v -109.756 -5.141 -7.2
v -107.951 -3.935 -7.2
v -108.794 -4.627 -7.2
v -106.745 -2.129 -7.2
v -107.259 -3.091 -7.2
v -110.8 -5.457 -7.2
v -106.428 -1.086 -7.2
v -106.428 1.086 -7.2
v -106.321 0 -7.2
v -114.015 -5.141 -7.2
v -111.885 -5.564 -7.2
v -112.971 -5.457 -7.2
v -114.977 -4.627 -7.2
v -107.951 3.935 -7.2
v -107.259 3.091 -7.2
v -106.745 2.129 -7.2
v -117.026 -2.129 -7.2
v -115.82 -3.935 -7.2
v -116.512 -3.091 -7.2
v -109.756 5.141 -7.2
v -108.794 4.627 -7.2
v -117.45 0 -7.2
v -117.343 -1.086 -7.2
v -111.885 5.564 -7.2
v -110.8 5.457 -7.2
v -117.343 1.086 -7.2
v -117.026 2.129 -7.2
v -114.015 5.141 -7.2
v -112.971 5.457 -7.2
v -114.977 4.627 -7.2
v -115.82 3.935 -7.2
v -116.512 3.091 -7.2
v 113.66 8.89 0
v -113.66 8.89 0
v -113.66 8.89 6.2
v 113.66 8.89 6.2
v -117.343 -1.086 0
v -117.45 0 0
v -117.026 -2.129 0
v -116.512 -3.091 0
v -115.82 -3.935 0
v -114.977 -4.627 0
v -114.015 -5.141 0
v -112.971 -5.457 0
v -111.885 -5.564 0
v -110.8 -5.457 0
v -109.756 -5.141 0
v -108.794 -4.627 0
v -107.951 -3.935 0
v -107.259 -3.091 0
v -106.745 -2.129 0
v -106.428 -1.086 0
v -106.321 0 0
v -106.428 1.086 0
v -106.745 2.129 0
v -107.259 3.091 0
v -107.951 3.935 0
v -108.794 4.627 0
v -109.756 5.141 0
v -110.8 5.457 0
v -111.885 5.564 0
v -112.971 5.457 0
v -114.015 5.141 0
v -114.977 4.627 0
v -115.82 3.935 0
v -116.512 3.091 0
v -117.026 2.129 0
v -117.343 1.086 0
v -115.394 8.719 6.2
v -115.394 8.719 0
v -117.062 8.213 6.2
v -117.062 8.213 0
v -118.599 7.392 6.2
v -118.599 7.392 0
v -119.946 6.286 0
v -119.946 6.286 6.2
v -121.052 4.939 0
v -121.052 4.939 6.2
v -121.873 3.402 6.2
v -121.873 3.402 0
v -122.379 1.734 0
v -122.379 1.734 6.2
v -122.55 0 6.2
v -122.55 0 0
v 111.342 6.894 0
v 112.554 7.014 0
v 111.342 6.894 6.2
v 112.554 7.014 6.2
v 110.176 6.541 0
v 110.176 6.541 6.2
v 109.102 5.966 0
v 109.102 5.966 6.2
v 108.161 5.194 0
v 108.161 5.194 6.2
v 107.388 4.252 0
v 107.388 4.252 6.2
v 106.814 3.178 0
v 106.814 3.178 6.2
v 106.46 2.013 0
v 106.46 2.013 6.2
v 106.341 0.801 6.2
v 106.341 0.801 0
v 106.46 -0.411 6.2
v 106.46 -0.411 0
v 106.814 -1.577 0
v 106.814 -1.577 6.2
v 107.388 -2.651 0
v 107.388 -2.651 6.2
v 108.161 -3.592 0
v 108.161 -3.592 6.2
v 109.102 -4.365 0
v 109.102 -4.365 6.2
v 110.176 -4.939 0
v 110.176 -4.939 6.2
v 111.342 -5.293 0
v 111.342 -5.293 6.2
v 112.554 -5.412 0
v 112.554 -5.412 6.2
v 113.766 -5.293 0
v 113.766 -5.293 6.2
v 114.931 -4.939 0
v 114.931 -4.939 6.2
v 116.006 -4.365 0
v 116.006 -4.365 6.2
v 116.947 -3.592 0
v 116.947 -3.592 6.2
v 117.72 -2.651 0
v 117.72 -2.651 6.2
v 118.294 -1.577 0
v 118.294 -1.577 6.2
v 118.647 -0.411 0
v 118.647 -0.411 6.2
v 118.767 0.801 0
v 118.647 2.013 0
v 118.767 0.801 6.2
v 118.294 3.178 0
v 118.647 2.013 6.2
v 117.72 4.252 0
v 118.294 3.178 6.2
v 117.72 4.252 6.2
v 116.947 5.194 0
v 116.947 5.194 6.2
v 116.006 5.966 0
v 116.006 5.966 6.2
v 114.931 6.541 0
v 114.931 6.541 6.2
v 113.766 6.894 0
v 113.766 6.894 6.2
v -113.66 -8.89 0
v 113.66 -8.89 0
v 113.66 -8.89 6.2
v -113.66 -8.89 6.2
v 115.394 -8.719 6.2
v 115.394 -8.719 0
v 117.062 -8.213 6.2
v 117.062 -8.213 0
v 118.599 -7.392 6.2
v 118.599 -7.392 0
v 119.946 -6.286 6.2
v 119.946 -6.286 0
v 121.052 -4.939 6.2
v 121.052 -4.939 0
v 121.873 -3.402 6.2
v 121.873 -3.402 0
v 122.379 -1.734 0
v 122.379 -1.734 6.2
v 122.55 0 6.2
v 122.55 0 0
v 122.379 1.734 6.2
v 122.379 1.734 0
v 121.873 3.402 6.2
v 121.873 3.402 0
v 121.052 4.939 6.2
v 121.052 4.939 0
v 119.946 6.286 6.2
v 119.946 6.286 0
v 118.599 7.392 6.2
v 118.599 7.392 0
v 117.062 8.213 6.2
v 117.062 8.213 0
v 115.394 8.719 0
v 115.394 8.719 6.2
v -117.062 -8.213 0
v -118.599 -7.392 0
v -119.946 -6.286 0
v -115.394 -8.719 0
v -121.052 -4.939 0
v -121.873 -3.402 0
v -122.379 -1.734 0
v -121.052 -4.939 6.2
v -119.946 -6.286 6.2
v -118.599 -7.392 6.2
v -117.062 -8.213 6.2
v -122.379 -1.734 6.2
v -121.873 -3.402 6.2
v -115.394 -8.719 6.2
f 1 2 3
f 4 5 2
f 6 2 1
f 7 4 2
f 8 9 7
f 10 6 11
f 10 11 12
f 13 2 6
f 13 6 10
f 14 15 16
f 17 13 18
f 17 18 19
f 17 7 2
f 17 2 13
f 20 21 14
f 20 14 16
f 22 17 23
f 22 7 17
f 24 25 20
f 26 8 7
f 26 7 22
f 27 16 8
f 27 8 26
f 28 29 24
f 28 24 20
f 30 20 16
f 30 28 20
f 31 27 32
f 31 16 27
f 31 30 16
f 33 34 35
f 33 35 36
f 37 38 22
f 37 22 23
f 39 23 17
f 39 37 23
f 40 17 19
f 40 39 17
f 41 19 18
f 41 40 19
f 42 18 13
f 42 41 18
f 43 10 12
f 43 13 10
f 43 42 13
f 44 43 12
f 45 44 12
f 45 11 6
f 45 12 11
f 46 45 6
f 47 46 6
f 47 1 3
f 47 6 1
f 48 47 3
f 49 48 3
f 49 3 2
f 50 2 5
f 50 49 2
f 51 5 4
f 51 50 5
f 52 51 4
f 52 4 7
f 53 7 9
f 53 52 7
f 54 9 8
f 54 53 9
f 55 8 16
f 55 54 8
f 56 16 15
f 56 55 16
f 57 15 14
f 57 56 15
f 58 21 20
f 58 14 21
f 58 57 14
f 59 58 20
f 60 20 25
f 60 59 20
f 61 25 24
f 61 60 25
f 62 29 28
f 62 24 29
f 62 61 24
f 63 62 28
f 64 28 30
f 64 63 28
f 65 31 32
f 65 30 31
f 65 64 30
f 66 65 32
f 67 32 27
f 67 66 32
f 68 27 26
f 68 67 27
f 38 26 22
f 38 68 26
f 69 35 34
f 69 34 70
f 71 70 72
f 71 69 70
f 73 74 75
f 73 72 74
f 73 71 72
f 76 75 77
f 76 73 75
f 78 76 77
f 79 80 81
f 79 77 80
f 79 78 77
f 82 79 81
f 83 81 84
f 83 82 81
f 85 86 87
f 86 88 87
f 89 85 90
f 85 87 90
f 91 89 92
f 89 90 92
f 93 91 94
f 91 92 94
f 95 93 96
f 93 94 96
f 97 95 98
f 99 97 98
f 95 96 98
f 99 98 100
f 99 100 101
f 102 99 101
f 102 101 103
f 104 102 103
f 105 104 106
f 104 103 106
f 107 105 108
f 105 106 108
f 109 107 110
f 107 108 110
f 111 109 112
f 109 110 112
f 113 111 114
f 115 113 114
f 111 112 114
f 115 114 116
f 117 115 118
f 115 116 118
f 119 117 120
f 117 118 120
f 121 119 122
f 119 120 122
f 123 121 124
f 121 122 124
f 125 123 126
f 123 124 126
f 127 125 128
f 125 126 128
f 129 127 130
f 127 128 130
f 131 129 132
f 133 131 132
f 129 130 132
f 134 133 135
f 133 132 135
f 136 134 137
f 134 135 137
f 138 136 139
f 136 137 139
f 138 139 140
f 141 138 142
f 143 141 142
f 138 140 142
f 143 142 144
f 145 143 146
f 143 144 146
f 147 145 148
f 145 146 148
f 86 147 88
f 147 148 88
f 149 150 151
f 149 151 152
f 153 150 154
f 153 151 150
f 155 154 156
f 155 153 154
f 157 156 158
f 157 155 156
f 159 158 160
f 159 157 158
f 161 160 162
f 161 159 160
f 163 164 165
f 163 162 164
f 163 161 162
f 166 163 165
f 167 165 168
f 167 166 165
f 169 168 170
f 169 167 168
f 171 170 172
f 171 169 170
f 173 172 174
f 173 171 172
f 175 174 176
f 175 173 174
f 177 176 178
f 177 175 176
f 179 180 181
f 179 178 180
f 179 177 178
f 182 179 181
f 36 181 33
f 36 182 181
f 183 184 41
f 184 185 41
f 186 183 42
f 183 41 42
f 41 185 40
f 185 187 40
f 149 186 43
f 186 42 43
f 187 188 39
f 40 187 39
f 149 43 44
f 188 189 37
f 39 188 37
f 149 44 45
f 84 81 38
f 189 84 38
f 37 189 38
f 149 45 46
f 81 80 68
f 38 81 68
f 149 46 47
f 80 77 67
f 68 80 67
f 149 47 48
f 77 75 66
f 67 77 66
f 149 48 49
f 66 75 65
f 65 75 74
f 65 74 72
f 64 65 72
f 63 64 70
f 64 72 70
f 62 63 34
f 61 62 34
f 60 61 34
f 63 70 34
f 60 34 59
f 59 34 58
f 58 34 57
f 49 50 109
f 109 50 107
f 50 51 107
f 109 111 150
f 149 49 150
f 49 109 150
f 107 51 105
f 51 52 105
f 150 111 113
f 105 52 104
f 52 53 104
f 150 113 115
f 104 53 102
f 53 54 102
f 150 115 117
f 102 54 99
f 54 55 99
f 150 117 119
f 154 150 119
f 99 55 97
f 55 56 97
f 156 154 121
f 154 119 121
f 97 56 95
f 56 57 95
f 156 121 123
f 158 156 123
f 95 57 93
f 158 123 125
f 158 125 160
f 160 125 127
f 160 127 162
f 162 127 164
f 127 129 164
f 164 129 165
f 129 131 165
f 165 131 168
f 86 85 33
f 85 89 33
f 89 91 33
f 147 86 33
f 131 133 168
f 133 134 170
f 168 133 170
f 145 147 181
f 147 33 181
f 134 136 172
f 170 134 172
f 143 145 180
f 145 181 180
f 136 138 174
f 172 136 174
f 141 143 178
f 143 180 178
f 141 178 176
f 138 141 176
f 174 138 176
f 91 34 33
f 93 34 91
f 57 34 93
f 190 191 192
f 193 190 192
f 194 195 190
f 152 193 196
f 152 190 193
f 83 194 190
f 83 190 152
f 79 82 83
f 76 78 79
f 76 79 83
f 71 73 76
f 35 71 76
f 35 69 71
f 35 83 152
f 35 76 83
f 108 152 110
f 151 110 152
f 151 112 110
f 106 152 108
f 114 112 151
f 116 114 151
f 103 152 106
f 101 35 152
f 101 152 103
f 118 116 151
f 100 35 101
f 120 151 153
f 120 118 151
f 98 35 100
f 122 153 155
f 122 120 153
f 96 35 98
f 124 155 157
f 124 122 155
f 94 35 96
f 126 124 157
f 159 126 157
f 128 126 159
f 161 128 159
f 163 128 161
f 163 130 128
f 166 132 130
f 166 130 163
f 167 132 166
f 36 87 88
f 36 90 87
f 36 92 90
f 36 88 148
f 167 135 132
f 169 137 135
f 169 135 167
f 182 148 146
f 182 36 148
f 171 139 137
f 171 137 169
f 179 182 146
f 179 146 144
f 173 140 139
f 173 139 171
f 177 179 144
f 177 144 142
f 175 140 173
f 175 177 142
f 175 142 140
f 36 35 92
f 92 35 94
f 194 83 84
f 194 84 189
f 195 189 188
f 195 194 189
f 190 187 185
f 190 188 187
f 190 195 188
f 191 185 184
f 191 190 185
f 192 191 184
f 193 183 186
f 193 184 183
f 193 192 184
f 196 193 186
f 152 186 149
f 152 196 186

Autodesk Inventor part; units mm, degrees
ref_plane "YZ Plane" through (0, 0, 0) normal (1, 0, 0) x (0, 1, 0)
ref_plane "XZ Plane" through (0, 0, 0) normal (0, 1, 0) x (-1, 0, 0)
ref_plane "XY Plane" through (0, 0, 0) normal (0, 0, 1) x (1, 0, 0)
sketch "Sketch1" plane through (0, 0, 0) normal (0, 0, 1) x (1, 0, 0)
  line L0 (-122.55, 8.89) -> (122.55, 8.89)
  line L1 (122.55, 8.89) -> (122.55, -8.89)
  line L2 (122.55, -8.89) -> (-122.55, -8.89)
  line L3 (-122.55, -8.89) -> (-122.55, 8.89)
  line L4 (-122.55, 8.89) -> (122.55, -8.89) construction
  line L5 (122.55, 8.89) -> (-122.55, -8.89) construction
  point P0 (0, 0)
  dimension "d0" = 245.1
  dimension "d1" = 17.78
extrude "Extrusion1" add sketch "Sketch1" along normal blind 6.2
fillet "Fillet1" radius 8.89 1 edges at (122.55, 8.89, 3.1)
fillet "Fillet2" radius 8.89 1 edges at (122.55, -8.89, 3.1)
fillet "Fillet3" radius 8.89 1 edges at (-122.55, -8.89, 3.1)
fillet "Fillet4" radius 8.89 1 edges at (-122.55, 8.89, 3.1)
sketch "Sketch6" plane through (0, 0, 0) normal (0, 0, -1) x (-1, 0, 0)
  circle A0 centre (111.8854, 0) radius 5.5644
  point P0 (0, 0)
extrude "Extrusion4" add sketch "Sketch6" along normal blind 7.2
sketch "Sketch7" plane through (0, 0, 0) normal (0, 0, -1) x (-1, 0, 0)
  point P0 (0, 0)
  point P1 (-112.5539, 0.8007)
hole "Hole3" at (112.5539, 0.8007, 0) direction (0, 0, 1) diameter 12.4257 end through all
equation "\"BendRadius\" = Thickness"
equation "\"BendReliefWidth\" = Thickness"
equation "\"BendReliefDepth\" = 0.5 * Thickness"
equation "\"CornerReliefSize\" = 4 * Thickness"
equation "\"MinimumRemnant\" = 2 * Thickness"
equation "\"TransitionRadius\" = BendRadius"
equation "\"JacobiRadiusSize\" = BendRadius"
equation "\"GapSize\" = Thickness"
equation "\"Thickness\" = 3.048"
properties part number "cranker rod part"
